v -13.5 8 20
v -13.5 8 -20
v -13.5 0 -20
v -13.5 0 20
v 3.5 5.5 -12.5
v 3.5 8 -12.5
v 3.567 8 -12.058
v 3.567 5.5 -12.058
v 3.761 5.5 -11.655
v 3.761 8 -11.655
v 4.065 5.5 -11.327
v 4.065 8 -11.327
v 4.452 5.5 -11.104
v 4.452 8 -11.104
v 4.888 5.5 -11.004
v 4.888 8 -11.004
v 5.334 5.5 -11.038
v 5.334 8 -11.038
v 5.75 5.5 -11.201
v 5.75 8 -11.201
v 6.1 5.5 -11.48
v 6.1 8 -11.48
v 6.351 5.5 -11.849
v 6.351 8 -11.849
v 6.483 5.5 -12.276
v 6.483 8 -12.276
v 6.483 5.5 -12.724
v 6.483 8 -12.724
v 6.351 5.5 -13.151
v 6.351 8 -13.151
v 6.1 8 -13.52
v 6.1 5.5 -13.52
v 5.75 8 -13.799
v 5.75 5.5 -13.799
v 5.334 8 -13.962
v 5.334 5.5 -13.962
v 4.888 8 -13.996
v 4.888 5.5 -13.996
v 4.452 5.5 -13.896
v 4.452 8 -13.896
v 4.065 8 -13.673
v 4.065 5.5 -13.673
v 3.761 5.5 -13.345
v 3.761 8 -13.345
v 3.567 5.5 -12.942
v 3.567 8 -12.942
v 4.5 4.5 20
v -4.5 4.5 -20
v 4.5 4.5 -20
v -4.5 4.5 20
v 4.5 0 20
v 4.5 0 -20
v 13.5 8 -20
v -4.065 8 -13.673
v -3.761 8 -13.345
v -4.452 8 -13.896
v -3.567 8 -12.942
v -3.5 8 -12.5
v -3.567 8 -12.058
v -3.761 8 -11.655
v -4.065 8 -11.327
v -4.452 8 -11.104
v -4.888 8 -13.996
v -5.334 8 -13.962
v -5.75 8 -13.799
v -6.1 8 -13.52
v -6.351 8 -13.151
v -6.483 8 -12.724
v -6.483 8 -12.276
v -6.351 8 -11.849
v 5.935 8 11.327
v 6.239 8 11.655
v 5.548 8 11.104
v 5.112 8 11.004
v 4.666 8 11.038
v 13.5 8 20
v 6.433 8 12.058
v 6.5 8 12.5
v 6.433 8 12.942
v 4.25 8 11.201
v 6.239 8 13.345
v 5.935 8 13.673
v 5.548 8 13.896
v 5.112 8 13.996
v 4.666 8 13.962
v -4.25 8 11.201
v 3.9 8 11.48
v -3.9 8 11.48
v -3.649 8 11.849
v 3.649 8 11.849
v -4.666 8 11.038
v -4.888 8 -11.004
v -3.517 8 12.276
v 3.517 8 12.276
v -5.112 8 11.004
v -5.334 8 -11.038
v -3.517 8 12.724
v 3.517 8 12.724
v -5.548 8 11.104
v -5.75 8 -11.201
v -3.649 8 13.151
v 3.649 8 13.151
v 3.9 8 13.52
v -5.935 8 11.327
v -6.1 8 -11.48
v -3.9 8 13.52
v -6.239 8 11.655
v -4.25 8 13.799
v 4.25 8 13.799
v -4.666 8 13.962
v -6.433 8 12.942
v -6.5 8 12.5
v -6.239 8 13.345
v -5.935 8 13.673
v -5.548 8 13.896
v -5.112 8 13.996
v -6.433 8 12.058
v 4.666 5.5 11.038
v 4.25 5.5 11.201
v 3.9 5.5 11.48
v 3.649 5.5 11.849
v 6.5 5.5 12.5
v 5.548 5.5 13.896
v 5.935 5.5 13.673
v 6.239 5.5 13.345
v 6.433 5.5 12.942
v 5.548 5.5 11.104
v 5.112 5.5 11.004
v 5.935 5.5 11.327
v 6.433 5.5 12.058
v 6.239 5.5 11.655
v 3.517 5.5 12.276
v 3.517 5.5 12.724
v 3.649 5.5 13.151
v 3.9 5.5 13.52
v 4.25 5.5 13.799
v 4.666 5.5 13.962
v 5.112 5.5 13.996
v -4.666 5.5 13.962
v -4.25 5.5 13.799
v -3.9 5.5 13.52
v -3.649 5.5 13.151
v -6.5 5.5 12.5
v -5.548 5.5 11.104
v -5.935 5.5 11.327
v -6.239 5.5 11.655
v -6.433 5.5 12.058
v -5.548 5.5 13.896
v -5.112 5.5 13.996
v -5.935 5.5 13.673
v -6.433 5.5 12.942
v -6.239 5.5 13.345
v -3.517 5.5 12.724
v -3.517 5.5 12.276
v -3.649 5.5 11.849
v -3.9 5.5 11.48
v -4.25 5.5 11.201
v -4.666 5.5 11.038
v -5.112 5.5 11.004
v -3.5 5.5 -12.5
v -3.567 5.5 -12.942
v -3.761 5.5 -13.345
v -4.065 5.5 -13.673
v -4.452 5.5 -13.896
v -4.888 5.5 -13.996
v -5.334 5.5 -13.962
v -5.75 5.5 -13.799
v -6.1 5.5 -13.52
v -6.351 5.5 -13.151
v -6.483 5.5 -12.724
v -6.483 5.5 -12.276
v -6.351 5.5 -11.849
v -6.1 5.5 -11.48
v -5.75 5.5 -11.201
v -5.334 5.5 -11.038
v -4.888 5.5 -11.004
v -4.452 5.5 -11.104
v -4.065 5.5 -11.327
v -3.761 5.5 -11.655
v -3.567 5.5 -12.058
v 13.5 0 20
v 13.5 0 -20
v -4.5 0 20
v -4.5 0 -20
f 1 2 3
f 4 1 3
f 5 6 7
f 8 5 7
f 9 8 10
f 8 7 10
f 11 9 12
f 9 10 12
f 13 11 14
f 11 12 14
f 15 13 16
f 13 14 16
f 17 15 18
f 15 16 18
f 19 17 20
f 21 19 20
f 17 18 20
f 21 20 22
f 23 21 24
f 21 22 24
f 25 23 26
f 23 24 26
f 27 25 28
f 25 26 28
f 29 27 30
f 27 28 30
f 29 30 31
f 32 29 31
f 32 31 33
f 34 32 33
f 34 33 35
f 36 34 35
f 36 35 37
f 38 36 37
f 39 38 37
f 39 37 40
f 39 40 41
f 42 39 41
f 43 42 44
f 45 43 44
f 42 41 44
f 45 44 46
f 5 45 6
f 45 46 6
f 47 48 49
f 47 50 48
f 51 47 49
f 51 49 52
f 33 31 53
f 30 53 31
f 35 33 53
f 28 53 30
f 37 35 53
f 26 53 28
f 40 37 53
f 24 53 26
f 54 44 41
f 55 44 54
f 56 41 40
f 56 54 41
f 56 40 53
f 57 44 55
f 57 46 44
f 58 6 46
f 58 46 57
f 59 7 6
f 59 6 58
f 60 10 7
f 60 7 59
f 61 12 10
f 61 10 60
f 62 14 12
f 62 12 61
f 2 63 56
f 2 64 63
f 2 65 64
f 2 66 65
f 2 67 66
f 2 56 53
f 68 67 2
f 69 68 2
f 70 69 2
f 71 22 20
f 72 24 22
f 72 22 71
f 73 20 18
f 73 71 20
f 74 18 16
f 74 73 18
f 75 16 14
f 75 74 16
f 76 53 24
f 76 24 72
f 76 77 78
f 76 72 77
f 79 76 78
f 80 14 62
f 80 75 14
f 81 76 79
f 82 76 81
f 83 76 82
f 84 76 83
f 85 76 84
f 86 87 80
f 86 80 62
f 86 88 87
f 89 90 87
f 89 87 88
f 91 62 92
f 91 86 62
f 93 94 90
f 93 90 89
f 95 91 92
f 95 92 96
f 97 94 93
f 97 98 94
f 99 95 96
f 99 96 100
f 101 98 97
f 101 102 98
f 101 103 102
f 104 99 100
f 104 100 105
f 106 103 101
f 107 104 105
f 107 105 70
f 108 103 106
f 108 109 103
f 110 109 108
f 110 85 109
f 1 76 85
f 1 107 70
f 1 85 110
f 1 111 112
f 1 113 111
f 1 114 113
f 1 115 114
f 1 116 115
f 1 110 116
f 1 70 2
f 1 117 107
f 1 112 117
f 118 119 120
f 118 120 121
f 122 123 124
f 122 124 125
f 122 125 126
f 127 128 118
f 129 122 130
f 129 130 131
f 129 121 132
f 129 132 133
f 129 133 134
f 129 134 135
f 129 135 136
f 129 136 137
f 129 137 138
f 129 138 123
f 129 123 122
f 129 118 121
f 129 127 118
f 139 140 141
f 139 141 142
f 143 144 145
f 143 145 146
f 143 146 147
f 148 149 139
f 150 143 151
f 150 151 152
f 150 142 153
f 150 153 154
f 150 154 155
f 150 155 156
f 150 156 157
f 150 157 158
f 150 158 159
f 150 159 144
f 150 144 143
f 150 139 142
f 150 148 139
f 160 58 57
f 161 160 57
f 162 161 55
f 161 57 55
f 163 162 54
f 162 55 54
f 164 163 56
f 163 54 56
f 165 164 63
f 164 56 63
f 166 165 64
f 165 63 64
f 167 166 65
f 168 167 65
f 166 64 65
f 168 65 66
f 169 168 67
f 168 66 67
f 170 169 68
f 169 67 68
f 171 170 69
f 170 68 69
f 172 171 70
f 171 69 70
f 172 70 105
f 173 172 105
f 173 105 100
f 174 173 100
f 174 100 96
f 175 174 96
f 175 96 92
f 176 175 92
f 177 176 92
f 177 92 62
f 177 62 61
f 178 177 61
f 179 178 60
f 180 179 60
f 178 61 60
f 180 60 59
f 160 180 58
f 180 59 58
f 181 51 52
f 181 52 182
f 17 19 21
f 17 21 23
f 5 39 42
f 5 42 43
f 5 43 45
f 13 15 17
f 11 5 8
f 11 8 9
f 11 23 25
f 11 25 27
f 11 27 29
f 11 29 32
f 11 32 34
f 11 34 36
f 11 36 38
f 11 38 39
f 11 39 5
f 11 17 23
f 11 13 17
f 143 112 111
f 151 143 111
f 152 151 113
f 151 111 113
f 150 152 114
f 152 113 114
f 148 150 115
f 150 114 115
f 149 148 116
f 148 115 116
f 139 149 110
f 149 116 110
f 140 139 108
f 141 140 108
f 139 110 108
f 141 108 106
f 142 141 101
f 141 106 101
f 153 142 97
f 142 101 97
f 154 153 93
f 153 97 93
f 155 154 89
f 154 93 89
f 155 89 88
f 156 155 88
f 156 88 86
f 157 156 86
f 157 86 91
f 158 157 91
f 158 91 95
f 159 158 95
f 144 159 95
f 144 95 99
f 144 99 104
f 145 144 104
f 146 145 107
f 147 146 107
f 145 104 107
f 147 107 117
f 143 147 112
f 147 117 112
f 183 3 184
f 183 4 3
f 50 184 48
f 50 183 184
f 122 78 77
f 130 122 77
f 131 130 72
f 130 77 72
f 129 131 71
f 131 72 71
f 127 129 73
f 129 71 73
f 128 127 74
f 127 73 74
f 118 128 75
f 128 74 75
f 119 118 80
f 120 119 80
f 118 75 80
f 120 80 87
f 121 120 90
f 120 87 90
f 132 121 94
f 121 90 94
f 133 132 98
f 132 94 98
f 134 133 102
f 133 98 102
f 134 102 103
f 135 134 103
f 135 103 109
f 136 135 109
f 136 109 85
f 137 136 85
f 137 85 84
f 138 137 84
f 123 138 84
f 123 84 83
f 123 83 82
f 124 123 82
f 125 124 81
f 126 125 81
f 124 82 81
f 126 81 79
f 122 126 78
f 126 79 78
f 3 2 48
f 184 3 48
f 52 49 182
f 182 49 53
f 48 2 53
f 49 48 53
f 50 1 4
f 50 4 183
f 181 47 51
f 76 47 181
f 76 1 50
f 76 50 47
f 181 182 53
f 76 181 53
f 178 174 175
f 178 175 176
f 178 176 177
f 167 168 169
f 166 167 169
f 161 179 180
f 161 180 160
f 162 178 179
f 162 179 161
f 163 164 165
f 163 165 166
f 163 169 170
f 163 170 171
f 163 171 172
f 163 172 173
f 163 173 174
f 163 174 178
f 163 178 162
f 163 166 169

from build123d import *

# Parameters (mm, degrees)
EXTRUDE_1_DEPTH     = 20
SKETCH_2_R          = 1.5
CUT_EXTRUDE_1_DEPTH = 2.5


with BuildPart() as part:
    # 草图1 → 凸台-拉伸1 (new, symmetric)
    with BuildSketch(Plane.XY):
        Polygon((-4.5, 4.5), (4.5, 4.5), (4.5, 0), (13.5, 0), (13.5, 8), (-13.5, 8), (-13.5, 0), (-4.5, 0), align=None)
    extrude(amount=EXTRUDE_1_DEPTH, both=True)

    # 草图2 → 切除-拉伸1 (cut)
    with BuildSketch(Plane(origin=(0, 8, 0), x_dir=(1, 0, 0), z_dir=(0, 1, 0))):
        with Locations(Location((5, 12.5, 0), (0, 0, 180))):
            Circle(SKETCH_2_R)
        with Locations((-5, 12.5)):
            Circle(SKETCH_2_R)
        with Locations(Location((-5, -12.5, 0), (0, 0, 180))):
            Circle(SKETCH_2_R)
        with Locations((5, -12.5)):
            Circle(SKETCH_2_R)
    extrude(amount=-CUT_EXTRUDE_1_DEPTH, mode=Mode.SUBTRACT)


solid = part.part
